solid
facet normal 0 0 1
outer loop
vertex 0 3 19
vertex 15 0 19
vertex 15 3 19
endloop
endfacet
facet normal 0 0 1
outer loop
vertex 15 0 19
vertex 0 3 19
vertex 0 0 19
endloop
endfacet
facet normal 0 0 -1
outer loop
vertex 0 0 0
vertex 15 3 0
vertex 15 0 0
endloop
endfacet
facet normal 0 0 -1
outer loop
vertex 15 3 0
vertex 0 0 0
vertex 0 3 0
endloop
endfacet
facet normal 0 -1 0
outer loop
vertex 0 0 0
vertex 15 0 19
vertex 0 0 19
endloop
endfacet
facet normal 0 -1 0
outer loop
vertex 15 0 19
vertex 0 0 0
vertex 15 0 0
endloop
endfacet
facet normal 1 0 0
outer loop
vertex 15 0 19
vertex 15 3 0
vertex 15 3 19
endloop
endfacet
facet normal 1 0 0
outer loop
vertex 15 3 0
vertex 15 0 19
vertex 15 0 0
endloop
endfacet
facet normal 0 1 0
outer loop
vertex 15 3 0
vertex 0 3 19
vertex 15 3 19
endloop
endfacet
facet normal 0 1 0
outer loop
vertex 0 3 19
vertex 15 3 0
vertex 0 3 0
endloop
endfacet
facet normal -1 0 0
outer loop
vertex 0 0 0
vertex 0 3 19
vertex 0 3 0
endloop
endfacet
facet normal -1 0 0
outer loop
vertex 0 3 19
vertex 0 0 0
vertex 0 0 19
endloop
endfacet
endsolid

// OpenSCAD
// Generated by SolidPython 1.0.1 on 2020-07-29 00:46:55


cube(size = [15, 3, 19]);
/***********************************************
*********      SolidPython code:      **********
************************************************
 
# import packages: SolidPython
from solid import *
from solid.utils import *
from itertools import chain, combinations, permutations


class Resize:

    def __init__(self, scad_file):
        self.scad_file = scad_file
        #self.scad_file = import_scad(scad_file)
        # cone/cylinder param:
        self.r1 = 0
        self.r2 = 0
        self.h = 0
        # rectangular prism param:
        self.w = 0
        self.l = 0
        # ellipse param:
        self.r = 0

    # import OpenScad code (file name corresponds to shape)


    # classify shape + parameters
    def assign(self, param1, param2, param3):
        if self.scad_file == 'cone.scad':
            self.r1 = param1
            self.r2 = param2
            self.h = param3
        elif self.scad_file == 'cylinder.scad':
            self.r1 = param1
            self.r2 = param2
            self.h = param3
        elif self.scad_file == 'rectangularPrism.scad':
            self.h = param1
            self.l = param2
            self.w = param3
        else:
            self.r = param1
            self.h = param2

    # resize parameters
    def iterate(self):
        x = range(3, 20, 2)
        i = 1
        if self.scad_file == 'cone.scad':
            tempList = list(permutations(x, 2))
            for temp in tempList:
                param1 = temp[0]
                param2 = temp[1]
                filepath = 'produced_scad_files/' + 'cone' + str(param1) + '_' + str(param2) + '_' + '.scad'
                scad_render_to_file(cylinder(h=param1, r1=param2, r2=0), filepath)

        elif self.scad_file == 'cylinder.scad':
            tempList = list(permutations(x, 3))
            for temp in tempList:
                param1 = temp[0]
                param2 = temp[1]
                filepath = 'produced_scad_files/' + 'cylinder' + str(param1) + '_' + str(param2) + '_' + '.scad'
                scad_render_to_file(cylinder(h=param1, r1=param2, r2=param2), filepath)

        elif self.scad_file == 'rectangularPrism.scad':
            tempList = list(permutations(x, 3))
            for temp in tempList:
                param1 = temp[0]
                param2 = temp[1]
                param3 = temp[2]
                filepath = 'produced_scad_files/' + 'rectangularPrism' + str(param1) + '_' + str(param2) + '_' + str(
                    param3) + '.scad'
                scad_render_to_file(cube(size=(param1, param2, param3)), filepath)

        elif self.scad_file == 'ellipse.scad':
            tempList = list(permutations(x, 4))
            for temp in tempList:
                param1 = temp[0]
                param2 = temp[1]
                param3 = temp[2]
                param4 = temp[3]
                filepath = 'produced_scad_files/' + 'ellipse' + str(param1) + '_' + str(param2) + '_' + str(param3) + '_' + str(param4) + '.scad'
                scad_render_to_file(scale([param1, param2, param3])(sphere(r=param4)), filepath)

    def render_to_scadfile(self):
        scad_render_to_file(scad, 'example.scad') 
 
************************************************/
